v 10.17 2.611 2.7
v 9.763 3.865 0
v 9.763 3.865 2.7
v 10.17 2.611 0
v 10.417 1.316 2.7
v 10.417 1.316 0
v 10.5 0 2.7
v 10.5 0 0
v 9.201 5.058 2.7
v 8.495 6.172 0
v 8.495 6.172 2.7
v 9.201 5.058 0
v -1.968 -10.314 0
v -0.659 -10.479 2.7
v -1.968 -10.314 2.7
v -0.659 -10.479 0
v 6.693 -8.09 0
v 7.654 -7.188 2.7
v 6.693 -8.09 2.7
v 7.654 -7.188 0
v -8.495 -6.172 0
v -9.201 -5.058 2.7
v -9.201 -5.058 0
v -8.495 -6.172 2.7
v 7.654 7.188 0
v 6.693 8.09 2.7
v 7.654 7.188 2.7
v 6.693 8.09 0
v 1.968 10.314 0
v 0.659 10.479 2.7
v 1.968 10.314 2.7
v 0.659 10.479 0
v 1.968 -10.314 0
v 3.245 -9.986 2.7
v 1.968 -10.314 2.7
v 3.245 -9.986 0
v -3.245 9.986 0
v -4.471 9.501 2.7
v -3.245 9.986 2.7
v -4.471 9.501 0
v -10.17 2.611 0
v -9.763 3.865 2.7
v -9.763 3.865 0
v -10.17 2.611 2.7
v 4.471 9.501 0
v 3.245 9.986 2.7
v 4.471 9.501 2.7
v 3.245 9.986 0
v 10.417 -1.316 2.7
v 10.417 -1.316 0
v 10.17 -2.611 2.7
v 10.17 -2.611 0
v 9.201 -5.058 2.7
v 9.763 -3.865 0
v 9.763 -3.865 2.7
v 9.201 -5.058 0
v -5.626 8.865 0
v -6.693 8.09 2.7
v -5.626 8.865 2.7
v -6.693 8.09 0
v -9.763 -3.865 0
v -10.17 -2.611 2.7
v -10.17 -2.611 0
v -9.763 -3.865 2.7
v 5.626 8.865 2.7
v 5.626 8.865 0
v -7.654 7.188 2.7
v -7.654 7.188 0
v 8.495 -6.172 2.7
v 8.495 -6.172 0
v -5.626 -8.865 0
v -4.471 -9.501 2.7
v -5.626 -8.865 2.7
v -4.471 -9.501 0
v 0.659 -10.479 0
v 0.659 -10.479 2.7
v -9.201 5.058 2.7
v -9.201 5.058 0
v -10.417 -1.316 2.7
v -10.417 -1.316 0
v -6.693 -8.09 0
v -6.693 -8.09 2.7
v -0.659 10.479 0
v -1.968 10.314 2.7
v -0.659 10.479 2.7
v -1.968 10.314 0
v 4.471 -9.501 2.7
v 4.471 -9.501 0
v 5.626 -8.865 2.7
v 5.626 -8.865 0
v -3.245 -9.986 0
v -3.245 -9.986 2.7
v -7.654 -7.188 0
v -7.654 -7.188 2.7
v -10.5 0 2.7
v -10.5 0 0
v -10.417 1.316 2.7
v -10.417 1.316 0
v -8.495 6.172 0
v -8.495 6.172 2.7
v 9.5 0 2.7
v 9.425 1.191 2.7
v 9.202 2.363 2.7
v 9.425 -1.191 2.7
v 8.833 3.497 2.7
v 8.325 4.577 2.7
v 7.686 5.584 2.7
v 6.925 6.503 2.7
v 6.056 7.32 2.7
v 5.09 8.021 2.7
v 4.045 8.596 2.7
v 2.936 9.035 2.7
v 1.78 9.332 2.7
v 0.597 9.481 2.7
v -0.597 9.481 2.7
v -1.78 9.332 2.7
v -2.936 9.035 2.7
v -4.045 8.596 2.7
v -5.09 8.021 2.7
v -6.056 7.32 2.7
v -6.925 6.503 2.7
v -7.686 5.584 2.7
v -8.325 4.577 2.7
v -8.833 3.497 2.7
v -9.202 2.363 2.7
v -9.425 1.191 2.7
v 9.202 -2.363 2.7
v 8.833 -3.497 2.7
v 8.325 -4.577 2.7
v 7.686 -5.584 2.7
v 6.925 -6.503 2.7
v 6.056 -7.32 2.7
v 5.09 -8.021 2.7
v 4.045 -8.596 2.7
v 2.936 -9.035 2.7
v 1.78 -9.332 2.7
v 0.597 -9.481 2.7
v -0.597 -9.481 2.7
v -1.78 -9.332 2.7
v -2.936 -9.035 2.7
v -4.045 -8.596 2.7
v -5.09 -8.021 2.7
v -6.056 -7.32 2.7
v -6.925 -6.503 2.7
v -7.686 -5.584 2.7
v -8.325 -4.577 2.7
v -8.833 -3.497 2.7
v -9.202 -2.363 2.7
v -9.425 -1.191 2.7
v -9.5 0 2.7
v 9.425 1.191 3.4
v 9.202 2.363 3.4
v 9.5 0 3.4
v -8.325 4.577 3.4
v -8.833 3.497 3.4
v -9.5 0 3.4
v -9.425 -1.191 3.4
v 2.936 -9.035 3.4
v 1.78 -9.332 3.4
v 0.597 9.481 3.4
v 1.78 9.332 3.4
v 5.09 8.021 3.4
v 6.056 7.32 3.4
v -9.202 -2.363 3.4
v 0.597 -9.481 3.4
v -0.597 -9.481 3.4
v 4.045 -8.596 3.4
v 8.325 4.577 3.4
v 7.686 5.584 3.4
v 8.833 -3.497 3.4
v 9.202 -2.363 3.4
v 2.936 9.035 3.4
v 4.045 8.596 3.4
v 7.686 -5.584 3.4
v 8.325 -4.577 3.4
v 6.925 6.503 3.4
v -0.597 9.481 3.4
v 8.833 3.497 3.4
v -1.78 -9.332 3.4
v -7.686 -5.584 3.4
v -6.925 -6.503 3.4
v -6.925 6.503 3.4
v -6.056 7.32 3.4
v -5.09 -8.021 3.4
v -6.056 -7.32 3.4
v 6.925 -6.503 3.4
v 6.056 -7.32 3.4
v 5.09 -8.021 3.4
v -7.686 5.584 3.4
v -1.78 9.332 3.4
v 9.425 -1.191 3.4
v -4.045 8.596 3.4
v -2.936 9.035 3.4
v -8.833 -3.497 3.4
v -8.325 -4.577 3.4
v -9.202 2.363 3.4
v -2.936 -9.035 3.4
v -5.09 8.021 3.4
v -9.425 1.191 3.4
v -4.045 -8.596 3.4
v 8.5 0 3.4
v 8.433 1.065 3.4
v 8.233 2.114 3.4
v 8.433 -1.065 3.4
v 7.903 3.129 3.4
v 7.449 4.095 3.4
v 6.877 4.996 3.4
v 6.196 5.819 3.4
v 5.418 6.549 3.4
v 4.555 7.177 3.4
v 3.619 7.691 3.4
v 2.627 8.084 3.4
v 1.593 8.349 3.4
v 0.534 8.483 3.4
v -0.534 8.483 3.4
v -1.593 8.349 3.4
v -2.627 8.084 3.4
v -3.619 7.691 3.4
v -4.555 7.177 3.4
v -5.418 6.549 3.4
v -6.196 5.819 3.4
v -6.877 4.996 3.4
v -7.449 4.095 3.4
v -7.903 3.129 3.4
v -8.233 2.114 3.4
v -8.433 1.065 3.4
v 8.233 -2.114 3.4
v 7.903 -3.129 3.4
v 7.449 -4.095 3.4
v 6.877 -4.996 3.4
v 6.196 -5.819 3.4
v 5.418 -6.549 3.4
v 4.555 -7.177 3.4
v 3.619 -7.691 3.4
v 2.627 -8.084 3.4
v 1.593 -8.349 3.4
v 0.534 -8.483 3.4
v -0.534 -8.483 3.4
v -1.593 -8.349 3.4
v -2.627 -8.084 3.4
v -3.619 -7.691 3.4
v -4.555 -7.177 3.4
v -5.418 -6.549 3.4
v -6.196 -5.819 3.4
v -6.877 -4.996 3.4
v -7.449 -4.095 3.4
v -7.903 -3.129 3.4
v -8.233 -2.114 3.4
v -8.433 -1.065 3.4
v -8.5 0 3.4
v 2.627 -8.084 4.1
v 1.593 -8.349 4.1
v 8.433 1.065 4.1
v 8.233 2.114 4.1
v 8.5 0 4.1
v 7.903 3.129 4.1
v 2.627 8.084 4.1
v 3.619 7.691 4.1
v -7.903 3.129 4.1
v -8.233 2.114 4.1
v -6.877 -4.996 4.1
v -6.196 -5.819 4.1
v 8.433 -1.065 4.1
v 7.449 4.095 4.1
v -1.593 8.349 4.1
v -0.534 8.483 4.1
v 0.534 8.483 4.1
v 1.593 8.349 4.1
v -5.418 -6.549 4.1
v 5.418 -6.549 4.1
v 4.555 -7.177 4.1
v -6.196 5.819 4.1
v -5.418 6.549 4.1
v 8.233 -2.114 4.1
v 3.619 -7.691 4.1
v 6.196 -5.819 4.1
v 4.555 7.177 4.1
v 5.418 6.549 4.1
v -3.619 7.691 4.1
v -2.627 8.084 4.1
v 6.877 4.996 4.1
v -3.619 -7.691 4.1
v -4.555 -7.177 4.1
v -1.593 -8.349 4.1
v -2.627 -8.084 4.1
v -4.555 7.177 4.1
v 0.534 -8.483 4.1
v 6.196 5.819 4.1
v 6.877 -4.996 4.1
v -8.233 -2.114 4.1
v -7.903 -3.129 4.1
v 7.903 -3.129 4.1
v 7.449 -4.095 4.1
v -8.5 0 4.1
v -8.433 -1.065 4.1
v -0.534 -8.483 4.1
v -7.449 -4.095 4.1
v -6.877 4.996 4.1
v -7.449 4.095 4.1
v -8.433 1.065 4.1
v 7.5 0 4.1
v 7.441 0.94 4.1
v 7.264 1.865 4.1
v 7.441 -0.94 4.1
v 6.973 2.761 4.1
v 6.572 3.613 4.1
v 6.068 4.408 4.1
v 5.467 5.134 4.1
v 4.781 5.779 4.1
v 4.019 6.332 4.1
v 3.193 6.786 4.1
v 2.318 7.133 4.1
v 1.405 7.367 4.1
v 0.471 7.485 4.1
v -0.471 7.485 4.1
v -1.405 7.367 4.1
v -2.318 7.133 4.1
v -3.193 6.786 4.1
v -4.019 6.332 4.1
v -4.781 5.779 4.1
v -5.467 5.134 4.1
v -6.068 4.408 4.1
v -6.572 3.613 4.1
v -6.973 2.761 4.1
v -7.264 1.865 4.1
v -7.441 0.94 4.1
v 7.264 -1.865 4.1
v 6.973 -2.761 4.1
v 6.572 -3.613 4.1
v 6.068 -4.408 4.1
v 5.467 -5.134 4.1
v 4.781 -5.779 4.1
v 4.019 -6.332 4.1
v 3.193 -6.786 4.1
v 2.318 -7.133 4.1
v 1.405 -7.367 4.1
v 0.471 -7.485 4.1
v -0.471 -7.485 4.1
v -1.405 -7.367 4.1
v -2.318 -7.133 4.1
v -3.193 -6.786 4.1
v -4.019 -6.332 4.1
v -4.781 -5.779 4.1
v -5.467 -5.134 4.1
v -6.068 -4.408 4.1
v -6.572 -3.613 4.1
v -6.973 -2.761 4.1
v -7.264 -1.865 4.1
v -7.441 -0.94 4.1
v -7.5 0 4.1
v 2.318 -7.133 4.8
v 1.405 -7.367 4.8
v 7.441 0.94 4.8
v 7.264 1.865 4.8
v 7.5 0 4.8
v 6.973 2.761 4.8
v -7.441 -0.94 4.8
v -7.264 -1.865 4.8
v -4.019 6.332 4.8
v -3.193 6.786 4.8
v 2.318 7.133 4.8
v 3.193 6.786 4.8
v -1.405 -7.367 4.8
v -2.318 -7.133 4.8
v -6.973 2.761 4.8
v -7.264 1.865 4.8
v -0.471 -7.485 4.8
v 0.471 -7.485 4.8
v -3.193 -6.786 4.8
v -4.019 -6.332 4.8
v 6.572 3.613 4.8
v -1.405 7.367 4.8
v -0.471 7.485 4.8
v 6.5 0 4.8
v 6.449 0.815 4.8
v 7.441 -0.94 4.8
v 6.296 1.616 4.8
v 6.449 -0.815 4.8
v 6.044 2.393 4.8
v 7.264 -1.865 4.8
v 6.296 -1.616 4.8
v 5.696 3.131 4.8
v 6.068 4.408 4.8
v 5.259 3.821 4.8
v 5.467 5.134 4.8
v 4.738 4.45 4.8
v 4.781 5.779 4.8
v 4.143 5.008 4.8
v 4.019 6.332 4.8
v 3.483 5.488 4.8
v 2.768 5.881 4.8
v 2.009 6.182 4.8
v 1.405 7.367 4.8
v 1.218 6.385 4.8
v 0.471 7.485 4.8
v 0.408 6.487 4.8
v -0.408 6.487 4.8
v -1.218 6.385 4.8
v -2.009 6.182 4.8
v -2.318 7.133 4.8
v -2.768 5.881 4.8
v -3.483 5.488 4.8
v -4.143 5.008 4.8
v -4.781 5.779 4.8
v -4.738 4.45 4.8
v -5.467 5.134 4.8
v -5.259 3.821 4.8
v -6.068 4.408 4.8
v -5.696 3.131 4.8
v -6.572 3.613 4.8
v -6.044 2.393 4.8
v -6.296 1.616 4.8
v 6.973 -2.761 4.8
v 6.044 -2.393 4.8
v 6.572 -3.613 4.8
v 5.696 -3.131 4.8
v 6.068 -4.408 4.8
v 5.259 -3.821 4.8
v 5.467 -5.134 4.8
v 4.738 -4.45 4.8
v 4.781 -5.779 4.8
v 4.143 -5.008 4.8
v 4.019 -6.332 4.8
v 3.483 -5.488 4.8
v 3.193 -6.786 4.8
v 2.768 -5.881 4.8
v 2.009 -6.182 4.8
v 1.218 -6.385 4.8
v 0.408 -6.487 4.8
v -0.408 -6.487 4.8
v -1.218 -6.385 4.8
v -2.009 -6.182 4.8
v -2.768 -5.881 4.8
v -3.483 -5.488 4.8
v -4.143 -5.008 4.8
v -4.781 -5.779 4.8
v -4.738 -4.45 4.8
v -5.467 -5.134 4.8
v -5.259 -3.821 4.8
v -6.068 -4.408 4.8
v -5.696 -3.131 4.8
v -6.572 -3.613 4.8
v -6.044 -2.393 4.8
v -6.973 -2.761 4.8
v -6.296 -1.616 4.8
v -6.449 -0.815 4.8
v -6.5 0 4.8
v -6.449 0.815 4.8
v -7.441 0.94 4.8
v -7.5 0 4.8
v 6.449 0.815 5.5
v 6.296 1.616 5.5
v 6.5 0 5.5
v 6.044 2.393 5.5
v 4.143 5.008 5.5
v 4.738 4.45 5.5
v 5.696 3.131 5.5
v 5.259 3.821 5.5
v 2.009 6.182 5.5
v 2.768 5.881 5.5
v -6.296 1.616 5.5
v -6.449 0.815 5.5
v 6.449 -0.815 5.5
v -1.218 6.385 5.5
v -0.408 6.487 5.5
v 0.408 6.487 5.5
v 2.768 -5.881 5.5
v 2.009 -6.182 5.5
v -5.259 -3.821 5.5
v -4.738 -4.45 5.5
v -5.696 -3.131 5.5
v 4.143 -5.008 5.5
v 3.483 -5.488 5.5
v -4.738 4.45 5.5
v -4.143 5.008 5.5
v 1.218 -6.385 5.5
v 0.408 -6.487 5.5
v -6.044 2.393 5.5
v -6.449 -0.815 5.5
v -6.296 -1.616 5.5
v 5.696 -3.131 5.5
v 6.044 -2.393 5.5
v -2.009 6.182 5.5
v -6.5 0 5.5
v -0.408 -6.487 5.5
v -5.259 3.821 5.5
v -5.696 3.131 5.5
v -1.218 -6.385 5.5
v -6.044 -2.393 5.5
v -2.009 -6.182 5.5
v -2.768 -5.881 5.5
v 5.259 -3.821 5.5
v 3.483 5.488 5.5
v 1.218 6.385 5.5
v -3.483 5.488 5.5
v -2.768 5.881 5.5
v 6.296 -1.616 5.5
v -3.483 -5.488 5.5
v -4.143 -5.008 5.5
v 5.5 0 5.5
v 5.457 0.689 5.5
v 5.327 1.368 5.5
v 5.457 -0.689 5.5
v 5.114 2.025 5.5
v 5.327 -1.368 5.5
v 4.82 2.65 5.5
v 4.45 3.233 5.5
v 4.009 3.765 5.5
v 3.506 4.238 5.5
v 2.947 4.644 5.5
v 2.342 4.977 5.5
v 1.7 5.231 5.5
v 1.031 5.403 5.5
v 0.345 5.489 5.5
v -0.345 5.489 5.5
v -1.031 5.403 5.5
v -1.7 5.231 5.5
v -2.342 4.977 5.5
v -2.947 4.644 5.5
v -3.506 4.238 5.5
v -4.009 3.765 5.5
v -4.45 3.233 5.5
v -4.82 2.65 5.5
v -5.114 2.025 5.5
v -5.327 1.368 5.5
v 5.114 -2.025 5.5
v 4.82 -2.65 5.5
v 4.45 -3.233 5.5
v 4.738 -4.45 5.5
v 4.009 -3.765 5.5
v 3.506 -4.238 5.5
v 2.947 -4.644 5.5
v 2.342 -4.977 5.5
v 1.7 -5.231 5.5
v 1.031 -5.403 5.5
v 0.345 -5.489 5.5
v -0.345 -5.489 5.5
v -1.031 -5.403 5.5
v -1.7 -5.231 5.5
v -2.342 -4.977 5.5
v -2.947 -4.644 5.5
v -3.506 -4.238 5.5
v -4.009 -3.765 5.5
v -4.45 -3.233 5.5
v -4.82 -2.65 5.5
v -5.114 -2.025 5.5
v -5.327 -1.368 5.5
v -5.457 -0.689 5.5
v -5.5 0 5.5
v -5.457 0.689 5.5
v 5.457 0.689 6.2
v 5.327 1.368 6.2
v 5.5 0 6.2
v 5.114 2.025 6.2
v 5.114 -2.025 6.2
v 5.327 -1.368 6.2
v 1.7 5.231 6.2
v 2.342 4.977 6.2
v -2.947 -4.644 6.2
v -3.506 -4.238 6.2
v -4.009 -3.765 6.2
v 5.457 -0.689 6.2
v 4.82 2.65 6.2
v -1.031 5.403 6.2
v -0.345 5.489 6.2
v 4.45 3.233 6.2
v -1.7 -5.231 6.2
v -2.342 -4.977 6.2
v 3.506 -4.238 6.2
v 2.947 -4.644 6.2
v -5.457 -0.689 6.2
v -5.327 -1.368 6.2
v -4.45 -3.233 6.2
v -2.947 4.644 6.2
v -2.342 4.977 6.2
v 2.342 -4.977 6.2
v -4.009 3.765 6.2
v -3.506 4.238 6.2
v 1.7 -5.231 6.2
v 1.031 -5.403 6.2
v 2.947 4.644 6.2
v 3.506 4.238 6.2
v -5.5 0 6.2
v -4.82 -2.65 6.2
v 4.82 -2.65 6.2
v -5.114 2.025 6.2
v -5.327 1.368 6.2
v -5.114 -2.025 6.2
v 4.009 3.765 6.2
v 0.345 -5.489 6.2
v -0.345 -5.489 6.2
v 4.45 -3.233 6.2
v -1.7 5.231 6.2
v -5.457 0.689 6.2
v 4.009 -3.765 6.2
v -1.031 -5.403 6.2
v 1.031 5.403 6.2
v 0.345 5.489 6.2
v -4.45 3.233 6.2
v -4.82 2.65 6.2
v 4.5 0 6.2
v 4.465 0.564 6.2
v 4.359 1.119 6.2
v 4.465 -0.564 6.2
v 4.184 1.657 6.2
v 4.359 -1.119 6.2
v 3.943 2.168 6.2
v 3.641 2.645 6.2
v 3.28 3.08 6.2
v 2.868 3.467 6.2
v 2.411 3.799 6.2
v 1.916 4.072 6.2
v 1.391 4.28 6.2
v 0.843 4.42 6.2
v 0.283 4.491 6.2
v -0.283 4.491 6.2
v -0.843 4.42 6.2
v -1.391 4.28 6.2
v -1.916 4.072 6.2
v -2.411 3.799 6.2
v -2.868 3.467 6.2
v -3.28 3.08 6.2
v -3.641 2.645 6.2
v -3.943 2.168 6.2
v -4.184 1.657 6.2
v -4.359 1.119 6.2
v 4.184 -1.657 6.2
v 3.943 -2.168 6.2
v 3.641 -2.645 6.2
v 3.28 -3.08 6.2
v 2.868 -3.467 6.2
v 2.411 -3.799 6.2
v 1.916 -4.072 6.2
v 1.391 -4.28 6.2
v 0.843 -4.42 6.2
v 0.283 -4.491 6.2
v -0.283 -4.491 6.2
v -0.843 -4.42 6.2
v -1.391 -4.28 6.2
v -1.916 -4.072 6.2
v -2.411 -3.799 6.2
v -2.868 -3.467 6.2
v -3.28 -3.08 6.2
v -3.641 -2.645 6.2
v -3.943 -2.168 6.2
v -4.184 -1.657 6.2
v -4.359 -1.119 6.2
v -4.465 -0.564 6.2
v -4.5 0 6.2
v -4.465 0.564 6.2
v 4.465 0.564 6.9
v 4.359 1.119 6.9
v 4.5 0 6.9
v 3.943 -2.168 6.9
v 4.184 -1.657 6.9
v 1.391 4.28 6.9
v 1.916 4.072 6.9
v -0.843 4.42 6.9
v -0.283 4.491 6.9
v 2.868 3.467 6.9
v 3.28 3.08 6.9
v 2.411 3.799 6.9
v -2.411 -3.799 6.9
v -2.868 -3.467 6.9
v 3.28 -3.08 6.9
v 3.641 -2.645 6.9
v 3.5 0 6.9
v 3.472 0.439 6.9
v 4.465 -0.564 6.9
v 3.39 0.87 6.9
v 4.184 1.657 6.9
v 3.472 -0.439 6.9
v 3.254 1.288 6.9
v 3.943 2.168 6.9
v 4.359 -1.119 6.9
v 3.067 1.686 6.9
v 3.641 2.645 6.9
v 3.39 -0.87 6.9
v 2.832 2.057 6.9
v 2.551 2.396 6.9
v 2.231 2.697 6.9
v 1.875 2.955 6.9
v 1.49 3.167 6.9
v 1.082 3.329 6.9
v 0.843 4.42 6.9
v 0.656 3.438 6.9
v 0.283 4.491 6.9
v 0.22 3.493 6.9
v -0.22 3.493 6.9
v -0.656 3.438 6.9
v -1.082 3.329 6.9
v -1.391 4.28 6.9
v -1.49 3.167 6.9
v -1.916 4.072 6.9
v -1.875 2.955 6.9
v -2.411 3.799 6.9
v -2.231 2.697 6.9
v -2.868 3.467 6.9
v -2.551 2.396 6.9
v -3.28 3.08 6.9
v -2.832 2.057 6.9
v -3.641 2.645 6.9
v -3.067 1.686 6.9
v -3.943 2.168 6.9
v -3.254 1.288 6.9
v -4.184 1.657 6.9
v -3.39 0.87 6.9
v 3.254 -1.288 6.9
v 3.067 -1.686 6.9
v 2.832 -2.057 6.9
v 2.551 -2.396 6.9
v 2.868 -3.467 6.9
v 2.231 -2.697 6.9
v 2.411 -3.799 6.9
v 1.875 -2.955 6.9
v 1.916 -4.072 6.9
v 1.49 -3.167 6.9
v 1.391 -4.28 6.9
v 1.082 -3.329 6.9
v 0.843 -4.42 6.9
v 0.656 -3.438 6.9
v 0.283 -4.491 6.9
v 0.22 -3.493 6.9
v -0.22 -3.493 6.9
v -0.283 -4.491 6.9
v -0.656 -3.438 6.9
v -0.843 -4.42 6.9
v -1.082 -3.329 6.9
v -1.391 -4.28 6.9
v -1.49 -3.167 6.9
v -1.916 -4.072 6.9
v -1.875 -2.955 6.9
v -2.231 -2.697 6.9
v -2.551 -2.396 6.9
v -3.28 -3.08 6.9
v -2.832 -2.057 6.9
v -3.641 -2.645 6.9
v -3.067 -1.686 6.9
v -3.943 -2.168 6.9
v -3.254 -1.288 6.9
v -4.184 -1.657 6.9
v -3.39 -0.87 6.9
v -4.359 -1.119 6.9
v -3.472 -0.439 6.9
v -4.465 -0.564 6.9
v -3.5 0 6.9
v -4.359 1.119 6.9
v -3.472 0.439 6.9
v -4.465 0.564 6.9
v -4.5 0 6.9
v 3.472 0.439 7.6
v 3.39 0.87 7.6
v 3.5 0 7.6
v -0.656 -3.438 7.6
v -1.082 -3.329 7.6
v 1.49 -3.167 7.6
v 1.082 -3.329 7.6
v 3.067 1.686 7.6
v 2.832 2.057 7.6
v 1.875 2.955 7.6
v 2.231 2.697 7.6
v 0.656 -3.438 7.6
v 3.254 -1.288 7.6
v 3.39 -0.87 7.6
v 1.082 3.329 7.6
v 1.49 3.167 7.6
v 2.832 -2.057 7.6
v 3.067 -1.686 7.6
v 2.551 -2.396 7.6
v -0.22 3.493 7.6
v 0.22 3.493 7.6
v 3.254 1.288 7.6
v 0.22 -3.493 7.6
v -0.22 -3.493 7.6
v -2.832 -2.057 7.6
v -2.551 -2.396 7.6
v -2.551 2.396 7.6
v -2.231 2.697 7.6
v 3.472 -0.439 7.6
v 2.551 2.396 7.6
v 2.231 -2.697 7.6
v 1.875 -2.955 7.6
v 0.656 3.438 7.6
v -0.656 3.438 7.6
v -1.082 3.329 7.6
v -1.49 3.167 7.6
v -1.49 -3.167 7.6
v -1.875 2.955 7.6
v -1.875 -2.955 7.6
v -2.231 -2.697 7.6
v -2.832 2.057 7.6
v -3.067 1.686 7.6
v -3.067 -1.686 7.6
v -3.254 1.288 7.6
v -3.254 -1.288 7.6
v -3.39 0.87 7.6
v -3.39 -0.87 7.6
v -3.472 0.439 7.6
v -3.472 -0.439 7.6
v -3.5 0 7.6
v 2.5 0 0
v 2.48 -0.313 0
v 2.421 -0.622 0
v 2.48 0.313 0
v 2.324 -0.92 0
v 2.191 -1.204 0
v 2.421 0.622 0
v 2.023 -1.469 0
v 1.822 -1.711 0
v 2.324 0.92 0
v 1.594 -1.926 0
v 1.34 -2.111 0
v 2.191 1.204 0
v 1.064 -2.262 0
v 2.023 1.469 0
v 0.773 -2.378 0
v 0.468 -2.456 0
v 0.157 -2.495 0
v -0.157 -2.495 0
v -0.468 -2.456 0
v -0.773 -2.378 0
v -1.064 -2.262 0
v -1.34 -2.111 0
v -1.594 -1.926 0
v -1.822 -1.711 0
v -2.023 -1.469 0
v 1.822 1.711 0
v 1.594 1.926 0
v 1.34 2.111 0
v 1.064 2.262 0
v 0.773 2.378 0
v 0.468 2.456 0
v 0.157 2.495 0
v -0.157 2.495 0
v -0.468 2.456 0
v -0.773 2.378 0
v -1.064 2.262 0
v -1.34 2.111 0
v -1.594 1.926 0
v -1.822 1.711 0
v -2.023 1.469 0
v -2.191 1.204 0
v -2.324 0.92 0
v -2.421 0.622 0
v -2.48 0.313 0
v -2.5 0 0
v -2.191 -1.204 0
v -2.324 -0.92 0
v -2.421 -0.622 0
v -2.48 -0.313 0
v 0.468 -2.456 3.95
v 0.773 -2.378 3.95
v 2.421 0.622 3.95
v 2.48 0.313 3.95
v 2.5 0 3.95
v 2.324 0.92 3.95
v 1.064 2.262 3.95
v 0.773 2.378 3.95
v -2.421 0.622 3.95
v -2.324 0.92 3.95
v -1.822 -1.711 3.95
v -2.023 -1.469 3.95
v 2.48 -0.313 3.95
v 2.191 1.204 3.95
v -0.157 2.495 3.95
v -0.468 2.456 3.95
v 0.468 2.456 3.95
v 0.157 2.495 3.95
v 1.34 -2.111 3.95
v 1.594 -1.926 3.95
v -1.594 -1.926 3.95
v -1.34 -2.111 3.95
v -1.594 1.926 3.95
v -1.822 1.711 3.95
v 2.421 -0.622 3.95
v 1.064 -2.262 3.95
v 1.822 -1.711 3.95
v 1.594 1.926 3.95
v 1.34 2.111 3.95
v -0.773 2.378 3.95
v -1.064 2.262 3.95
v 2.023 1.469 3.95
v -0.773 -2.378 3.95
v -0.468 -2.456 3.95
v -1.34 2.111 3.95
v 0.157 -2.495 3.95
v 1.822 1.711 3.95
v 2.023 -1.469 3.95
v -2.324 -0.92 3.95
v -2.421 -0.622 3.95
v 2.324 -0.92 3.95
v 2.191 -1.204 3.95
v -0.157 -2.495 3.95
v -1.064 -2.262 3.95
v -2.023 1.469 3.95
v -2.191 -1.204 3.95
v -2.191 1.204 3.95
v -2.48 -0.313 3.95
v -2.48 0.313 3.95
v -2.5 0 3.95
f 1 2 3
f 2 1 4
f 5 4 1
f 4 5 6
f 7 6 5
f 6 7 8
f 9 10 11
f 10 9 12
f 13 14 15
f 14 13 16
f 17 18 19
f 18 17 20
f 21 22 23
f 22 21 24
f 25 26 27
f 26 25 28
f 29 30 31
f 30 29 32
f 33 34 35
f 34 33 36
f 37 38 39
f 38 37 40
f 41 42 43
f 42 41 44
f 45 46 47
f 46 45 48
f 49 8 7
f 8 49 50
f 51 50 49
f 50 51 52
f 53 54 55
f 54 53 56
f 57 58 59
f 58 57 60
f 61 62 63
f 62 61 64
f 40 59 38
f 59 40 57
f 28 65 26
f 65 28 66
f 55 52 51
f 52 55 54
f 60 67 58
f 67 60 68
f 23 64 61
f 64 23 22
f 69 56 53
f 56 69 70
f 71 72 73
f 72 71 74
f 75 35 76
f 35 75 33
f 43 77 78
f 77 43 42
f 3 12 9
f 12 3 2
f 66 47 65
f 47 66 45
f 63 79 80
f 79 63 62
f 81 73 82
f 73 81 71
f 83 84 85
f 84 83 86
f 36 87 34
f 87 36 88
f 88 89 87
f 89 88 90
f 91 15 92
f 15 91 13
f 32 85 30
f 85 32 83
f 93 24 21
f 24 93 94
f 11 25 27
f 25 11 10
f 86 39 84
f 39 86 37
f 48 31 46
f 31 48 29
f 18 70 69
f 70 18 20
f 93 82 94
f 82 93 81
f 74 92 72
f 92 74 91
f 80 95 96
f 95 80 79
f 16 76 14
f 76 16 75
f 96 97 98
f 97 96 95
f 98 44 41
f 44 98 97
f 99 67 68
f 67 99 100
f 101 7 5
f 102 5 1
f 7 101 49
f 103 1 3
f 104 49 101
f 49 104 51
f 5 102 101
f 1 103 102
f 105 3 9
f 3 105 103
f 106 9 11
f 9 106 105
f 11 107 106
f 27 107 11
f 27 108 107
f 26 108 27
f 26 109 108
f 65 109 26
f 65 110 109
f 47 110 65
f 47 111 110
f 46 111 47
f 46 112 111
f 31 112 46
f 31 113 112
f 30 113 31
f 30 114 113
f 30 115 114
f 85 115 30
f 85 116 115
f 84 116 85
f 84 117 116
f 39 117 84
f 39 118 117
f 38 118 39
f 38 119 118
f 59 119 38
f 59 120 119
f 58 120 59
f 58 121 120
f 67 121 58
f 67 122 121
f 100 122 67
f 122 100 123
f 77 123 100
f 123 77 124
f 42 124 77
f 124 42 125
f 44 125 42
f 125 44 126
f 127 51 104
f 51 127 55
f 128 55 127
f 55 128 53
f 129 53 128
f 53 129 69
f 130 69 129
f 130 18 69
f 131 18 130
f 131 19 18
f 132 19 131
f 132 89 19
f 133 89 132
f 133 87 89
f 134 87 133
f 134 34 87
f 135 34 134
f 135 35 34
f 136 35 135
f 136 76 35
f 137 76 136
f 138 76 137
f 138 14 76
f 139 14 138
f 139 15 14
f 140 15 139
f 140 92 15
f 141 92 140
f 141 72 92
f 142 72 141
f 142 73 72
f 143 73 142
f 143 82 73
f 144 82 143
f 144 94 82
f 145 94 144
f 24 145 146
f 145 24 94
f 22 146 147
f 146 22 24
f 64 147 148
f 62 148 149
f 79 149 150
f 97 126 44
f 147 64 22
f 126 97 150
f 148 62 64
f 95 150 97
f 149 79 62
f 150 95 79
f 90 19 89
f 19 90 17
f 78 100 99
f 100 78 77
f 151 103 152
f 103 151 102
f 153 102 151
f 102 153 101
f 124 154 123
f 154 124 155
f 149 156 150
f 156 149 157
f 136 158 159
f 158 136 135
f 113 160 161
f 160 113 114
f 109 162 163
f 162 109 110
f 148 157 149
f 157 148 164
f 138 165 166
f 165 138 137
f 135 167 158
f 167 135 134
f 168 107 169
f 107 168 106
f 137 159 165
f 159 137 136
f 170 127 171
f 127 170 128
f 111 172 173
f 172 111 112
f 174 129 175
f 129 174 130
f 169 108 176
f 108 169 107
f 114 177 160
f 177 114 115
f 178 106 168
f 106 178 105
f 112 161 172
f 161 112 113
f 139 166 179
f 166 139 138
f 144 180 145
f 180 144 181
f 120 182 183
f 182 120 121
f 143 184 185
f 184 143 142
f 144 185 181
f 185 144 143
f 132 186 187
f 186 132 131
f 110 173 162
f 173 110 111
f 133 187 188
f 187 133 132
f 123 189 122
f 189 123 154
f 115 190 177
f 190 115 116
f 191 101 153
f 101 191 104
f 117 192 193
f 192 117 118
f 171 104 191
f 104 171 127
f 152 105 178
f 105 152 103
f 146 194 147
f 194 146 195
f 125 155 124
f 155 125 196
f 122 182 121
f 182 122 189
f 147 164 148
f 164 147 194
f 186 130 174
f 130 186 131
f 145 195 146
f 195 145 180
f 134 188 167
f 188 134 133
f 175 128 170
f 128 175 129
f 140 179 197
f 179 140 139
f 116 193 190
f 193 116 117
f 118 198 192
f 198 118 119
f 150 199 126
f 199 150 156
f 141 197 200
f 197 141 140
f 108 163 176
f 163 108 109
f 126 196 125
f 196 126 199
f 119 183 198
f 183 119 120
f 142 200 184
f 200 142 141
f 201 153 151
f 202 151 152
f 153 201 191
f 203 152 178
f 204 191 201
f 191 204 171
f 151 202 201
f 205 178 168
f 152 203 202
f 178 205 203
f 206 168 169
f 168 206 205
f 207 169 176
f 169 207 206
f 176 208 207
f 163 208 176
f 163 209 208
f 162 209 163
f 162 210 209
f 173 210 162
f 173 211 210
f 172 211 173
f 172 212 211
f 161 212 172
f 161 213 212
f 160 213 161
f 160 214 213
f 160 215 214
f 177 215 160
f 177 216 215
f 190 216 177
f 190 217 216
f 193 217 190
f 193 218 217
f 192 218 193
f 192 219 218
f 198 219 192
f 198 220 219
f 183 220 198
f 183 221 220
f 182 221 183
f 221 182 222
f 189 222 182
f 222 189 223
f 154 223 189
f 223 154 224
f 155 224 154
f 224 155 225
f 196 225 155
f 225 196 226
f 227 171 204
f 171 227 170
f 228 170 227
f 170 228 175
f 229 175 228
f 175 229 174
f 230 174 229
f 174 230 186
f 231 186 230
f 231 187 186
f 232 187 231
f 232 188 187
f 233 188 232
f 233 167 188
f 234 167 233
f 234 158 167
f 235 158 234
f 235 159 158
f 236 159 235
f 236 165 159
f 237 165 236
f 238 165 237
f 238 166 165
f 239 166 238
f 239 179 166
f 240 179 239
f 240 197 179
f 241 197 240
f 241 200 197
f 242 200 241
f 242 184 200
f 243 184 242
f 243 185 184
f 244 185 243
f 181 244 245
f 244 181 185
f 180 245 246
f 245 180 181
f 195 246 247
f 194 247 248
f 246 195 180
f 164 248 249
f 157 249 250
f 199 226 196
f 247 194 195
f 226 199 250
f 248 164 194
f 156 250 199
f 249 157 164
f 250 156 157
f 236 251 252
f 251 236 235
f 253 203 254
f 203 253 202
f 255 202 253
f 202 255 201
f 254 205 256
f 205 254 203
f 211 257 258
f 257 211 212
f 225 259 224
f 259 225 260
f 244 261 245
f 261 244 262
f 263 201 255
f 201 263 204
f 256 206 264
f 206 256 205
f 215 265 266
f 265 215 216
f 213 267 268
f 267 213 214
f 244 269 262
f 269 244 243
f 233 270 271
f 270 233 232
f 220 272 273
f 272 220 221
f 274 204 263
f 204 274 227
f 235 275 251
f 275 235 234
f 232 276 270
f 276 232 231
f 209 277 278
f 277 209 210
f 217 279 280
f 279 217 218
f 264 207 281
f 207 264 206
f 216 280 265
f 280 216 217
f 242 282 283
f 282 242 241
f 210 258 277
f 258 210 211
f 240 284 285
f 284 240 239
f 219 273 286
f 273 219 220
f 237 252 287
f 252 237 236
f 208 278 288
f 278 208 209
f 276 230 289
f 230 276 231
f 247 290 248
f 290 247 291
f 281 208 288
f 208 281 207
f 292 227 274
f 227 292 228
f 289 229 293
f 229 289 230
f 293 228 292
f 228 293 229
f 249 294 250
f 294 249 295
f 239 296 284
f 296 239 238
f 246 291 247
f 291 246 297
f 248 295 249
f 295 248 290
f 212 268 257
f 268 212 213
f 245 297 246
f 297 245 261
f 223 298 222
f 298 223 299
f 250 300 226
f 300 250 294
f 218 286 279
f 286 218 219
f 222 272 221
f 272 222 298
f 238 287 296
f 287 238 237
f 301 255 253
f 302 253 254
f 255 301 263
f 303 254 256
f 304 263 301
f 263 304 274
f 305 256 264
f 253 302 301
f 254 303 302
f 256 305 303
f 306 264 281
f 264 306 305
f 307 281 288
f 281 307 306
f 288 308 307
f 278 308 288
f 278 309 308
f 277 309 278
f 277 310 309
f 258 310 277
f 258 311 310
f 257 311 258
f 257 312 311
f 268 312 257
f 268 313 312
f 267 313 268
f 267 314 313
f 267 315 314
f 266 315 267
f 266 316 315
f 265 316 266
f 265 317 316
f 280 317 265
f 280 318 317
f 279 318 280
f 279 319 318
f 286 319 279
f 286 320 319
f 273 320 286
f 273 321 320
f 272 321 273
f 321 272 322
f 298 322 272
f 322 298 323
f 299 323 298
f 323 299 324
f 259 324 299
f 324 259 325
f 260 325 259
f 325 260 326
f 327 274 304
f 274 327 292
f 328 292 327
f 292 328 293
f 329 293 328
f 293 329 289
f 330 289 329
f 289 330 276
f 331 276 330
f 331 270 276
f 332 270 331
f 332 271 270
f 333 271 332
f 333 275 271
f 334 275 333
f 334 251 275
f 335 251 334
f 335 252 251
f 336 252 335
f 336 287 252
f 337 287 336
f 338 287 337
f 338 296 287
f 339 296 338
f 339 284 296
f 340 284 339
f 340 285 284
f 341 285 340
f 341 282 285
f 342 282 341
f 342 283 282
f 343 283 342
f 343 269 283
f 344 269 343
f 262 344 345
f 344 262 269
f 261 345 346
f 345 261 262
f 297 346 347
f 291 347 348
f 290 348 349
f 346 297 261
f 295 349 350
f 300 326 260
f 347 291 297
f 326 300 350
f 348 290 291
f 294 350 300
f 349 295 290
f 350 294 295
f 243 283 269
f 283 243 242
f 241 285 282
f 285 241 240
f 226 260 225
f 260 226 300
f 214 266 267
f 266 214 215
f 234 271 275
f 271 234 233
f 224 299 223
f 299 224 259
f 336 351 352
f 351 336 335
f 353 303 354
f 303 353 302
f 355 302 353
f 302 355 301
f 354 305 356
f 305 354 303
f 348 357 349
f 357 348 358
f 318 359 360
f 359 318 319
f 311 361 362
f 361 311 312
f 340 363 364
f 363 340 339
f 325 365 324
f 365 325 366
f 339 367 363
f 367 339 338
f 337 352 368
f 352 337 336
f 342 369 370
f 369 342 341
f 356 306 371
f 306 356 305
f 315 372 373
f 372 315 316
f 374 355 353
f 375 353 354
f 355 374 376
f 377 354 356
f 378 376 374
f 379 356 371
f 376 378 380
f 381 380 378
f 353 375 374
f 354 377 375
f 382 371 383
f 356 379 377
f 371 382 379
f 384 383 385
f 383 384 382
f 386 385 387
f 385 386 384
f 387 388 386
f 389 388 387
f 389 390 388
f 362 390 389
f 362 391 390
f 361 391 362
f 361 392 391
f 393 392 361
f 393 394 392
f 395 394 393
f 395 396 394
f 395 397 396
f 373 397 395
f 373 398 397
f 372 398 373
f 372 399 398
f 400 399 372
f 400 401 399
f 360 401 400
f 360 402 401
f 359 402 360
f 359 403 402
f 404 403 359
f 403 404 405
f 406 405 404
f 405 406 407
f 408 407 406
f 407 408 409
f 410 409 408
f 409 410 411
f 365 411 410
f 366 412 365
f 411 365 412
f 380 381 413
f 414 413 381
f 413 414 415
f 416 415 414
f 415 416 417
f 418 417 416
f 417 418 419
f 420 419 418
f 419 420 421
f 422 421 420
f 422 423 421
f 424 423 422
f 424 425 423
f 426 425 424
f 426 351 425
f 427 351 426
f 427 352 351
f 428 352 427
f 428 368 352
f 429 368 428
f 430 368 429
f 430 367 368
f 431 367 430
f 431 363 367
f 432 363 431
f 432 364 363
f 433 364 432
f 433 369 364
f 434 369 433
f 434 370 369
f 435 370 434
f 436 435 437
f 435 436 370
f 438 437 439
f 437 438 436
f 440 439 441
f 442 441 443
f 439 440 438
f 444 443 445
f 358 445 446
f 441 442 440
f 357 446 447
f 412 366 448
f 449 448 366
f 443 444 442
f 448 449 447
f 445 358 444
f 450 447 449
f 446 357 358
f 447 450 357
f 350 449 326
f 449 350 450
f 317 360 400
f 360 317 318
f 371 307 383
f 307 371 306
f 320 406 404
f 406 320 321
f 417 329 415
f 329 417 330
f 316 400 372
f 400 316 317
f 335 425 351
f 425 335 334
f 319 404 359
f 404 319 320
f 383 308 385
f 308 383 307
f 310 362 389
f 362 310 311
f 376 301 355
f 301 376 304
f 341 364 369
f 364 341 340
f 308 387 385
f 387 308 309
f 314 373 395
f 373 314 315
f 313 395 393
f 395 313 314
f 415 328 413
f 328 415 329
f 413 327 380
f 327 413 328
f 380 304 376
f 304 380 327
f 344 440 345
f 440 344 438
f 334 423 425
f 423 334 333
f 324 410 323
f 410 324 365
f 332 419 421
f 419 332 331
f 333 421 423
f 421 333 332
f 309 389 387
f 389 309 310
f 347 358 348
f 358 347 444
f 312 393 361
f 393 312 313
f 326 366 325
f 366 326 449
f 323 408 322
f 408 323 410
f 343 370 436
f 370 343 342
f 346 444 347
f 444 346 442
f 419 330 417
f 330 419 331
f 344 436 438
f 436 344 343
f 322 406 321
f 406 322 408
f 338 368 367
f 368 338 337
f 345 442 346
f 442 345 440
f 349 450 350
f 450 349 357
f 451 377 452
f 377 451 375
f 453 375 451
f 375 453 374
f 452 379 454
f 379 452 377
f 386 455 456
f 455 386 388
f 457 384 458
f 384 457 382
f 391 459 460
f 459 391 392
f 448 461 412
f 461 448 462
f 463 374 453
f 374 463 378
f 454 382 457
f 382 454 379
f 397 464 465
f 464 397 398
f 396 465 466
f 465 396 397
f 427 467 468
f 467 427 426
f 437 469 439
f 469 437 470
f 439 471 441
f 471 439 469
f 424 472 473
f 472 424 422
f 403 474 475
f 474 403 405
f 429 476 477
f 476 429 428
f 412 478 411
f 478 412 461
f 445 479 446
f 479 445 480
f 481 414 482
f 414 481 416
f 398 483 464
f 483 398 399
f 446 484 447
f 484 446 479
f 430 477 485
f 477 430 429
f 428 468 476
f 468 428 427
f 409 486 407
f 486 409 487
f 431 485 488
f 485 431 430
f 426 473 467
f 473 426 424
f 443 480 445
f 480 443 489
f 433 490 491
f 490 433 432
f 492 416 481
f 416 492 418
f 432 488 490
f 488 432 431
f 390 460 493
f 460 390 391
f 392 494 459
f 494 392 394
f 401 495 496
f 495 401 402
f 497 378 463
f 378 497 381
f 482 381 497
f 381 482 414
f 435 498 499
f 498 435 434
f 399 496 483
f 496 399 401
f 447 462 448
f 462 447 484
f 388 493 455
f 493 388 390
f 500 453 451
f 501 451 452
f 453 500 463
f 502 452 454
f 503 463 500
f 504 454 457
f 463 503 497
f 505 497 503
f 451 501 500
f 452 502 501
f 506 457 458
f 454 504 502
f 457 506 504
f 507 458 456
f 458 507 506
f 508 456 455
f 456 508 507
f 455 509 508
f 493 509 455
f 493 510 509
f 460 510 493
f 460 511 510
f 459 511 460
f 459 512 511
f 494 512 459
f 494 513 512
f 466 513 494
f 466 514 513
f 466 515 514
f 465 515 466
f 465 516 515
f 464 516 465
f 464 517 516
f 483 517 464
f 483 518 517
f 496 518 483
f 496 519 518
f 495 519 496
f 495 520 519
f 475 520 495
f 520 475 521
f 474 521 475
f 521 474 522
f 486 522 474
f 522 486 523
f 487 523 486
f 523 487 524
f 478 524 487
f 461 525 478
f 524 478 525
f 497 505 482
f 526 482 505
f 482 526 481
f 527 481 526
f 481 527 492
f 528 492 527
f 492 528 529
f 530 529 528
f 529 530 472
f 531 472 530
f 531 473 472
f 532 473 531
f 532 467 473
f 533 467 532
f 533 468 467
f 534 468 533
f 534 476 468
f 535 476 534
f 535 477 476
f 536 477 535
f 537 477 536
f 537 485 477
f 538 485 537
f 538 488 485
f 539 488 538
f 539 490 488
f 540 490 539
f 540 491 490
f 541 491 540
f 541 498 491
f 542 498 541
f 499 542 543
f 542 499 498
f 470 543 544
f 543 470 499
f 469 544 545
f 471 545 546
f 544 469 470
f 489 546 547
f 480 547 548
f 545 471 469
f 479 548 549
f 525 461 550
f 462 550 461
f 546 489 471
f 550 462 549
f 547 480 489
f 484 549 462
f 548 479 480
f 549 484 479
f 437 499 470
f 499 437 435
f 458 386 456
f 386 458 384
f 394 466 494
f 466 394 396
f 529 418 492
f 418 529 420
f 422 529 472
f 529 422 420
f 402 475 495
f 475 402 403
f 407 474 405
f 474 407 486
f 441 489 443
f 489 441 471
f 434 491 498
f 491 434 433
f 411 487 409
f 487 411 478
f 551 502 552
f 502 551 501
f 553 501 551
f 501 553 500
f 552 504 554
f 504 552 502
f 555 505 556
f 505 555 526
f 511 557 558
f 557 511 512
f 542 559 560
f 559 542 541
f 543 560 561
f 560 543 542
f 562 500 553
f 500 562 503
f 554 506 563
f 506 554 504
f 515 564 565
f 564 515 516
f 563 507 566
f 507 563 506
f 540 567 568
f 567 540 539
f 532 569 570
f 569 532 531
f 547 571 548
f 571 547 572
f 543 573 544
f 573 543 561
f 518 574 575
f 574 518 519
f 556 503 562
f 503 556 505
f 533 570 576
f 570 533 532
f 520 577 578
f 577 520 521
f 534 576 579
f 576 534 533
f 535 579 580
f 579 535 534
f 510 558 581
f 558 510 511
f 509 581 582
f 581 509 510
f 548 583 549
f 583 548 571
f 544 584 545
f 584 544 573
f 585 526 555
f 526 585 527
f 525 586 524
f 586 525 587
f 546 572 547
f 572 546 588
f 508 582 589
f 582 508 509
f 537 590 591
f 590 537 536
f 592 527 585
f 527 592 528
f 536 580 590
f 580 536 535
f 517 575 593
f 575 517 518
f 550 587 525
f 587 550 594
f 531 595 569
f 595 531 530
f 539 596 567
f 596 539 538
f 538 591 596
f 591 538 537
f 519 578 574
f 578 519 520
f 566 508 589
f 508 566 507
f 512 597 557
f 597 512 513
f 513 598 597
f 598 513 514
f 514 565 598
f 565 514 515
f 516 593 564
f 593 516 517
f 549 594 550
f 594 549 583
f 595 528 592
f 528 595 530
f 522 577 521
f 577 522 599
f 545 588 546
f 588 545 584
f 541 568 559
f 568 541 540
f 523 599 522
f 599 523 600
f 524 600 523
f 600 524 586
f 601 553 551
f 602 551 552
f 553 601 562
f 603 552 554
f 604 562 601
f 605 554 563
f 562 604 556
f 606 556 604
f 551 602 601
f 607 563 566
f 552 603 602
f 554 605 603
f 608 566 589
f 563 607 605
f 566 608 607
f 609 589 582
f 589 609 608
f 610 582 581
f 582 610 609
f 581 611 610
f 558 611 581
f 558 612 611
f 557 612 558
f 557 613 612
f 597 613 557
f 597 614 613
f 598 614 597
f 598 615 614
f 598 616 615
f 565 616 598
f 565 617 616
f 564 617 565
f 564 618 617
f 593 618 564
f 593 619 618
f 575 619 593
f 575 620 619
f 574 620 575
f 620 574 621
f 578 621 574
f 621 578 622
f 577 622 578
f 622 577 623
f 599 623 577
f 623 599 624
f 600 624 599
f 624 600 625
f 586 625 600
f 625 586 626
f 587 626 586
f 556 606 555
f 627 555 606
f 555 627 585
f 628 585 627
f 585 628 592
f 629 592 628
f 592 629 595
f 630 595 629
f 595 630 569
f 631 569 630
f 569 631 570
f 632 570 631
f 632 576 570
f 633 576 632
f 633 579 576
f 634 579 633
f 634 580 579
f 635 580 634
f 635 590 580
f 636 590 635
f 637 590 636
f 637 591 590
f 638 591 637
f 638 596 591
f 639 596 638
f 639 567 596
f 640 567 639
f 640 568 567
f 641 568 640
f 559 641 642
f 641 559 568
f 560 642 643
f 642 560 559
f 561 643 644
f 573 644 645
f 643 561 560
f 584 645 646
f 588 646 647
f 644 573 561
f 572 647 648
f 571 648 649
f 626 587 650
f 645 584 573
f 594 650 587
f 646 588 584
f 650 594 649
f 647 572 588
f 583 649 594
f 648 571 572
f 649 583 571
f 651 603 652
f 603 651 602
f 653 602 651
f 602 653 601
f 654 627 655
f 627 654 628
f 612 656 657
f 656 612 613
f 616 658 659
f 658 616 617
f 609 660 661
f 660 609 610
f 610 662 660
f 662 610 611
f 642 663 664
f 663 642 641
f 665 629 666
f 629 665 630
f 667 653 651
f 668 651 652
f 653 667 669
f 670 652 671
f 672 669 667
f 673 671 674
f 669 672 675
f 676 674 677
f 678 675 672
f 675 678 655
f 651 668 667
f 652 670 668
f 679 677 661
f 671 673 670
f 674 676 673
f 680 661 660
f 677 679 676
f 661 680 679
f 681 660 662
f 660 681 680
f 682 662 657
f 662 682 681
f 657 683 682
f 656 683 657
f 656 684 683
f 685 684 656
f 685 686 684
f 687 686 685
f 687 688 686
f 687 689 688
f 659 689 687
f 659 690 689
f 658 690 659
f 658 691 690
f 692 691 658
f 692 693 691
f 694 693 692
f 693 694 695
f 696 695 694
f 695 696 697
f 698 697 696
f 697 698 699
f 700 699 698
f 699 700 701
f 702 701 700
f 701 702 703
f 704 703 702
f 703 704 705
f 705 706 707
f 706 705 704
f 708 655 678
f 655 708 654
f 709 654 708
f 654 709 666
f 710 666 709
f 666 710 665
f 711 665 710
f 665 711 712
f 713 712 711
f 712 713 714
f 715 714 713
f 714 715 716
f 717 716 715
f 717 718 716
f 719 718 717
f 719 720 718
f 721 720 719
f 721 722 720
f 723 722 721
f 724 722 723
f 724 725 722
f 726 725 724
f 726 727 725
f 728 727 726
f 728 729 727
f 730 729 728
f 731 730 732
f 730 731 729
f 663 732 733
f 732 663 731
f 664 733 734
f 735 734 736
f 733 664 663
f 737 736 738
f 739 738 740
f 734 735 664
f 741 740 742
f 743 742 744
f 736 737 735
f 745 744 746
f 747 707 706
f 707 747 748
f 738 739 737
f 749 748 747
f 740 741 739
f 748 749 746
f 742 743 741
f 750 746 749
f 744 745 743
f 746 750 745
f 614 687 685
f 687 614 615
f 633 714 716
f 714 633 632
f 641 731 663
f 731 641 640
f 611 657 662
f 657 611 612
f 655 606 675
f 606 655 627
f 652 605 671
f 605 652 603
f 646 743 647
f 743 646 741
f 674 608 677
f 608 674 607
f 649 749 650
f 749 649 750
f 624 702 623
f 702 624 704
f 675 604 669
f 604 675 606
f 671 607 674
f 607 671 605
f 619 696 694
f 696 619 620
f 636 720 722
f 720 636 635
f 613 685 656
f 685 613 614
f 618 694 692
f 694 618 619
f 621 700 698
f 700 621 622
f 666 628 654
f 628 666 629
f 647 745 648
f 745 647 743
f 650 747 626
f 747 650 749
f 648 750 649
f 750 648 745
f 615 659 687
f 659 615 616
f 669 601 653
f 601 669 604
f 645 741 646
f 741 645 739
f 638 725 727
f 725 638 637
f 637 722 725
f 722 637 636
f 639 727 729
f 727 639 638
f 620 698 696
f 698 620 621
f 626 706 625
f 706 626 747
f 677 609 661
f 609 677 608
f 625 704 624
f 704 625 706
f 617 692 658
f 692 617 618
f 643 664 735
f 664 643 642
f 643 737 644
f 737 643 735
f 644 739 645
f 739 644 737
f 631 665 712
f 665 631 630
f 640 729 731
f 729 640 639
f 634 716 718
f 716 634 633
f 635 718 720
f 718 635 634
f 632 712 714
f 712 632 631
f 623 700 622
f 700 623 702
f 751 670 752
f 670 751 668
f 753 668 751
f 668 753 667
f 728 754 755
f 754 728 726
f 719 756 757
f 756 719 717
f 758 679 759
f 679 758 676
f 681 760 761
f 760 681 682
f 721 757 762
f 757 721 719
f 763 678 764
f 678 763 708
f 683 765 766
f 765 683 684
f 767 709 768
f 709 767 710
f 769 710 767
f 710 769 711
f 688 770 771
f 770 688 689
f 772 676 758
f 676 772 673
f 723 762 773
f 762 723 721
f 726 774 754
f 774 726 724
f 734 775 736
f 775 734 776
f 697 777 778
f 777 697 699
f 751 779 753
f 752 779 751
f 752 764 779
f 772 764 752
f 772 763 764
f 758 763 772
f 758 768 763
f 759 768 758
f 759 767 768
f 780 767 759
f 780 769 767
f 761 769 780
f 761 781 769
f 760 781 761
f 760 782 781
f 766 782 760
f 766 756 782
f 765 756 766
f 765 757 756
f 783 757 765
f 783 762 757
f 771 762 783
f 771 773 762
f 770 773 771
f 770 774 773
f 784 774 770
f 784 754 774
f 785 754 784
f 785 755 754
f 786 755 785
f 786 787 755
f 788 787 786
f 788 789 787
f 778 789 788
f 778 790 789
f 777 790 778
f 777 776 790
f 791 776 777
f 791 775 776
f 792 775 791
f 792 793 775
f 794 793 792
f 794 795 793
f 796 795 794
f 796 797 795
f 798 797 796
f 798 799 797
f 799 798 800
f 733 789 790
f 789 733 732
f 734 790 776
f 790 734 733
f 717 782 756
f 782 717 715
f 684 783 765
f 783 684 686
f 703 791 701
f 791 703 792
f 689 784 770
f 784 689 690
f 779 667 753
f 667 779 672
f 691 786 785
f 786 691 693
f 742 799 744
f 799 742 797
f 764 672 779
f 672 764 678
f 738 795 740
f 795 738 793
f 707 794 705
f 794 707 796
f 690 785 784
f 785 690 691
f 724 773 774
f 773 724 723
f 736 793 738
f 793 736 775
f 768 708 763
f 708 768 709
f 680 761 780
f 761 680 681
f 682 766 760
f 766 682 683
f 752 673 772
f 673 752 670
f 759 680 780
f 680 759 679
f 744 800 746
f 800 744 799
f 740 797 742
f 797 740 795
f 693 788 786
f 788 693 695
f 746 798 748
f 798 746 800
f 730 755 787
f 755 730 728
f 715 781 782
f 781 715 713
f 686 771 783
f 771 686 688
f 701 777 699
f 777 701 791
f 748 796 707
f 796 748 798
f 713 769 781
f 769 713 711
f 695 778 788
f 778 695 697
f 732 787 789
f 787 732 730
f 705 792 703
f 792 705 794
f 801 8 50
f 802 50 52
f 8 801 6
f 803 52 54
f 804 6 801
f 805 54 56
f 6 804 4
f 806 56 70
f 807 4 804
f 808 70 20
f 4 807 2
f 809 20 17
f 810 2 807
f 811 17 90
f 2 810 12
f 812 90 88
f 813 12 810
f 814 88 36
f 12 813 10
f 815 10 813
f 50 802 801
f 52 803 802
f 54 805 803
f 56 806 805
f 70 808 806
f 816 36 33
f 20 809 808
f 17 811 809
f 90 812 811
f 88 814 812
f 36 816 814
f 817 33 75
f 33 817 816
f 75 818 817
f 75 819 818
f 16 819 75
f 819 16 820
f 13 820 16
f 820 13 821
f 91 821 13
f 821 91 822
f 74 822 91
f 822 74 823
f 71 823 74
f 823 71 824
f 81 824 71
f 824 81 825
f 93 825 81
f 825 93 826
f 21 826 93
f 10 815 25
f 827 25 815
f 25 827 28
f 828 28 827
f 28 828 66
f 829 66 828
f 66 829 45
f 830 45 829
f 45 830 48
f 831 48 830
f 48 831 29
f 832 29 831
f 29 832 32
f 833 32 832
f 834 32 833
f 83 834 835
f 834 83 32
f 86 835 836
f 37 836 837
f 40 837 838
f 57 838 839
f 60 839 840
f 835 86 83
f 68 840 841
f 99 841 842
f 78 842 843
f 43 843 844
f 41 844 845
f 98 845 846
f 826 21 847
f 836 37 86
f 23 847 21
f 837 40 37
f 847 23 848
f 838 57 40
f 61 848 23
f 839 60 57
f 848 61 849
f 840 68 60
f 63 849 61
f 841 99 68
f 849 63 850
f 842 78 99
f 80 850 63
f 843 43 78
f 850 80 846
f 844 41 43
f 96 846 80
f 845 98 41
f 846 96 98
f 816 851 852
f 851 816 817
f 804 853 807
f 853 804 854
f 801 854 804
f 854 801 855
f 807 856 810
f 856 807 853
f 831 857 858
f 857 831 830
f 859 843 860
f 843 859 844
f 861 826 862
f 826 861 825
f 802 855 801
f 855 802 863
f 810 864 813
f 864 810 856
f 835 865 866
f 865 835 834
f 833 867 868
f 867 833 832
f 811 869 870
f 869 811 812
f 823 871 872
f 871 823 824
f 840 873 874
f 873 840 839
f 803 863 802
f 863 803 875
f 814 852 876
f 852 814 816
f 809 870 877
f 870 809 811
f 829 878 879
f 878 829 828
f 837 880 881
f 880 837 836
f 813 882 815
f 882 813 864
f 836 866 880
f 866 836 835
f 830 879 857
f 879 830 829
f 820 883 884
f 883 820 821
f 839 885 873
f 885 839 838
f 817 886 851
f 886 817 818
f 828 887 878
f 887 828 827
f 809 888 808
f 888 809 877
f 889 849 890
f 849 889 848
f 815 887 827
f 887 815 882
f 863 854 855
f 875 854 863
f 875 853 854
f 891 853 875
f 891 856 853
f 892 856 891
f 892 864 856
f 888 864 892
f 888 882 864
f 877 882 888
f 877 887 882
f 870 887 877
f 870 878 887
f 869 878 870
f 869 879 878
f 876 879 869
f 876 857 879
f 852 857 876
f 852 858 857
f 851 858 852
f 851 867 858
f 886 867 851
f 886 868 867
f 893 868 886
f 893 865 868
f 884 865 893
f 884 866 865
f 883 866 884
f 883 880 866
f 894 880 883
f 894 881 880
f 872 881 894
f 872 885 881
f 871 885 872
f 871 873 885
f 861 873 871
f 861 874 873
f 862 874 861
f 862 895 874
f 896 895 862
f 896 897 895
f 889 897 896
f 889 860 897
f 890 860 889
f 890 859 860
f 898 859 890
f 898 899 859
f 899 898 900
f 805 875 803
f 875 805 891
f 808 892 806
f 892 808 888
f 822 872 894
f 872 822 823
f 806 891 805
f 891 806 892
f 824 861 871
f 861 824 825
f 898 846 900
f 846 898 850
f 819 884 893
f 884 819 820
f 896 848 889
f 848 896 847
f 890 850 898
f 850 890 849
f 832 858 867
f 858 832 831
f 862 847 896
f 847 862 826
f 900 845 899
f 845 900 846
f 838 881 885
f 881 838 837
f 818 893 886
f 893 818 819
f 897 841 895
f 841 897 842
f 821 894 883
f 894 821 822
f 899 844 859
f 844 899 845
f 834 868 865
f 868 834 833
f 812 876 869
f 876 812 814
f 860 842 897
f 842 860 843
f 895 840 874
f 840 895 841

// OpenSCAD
// file: joystick_defines.scad
// Standard skate bearing
bearing_inside_dia = 8;
bearing_outside_dia = 22;
bearing_thickness = 7;

// Arbitrary value
shaft_dia = 15;

z_fight_fudge = 0.05;
//z_fight_fudge = 0;

// Set this to 1 to translate everything to printable mode
printable_mode = 0;

// Gimba corel block sizes 
gimbal_core_x = 50;
gimbal_core_y = 30;
gimbal_core_z = gimbal_core_y;

// Gimbal frame sizes 

gimbal_frame_thickness = 10; 

// The 1.8 is 2sin(45)ish, the maximum y on the xy plane the core can occupy
gimbal_frame_x = gimbal_core_x+2*gimbal_frame_thickness+2; 
gimbal_frame_y = (gimbal_core_y * 1.8)+gimbal_frame_thickness;
gimbal_frame_z = gimbal_core_z;

circle_faces = 50;

module bearing()
{
	difference()
	{
		cylinder(h=7+2*z_fight_fudge, r = (bearing_outside_dia/2), $fn=circle_faces);

		/*translate([0,0,-z_fight_fudge])
			%cylinder(h=9, r = (bearing_inside_dia/2), $fn=circle_faces);*/
	}
}
		
// main file
include <joystick_defines.scad>

// variables for little microswitch pushbutton, might move these to joystick_defines
pb_xy = 7.5;
pb_z = 4; // Height minus pushbutton
pb_btn_z = 1.5;
pb_total_z = pb_z+pb_btn_z;
pb_btn_dia = 3;
pb_leg_x = 4;
pb_leg_y = 5;
pb_leg_z = 0.7;

4_way_hat_base_dia = 21;
4_way_hat_base_base_z = 2; // Base thickness
4_way_hat_base_z = pb_xy + 4_way_hat_base_base_z;

4_way_hat_base_screw_dia = 5;

/*hat_base(4);
translate([0,0,10])
	4_way_hat_washer();
translate([0,0,13])
	switch_hat_saddle();*/
	switch_hat_hanoi();
//pb(1);

module hat_base(numDirs)
{
	difference()
	{
		cylinder(r=(4_way_hat_base_dia/2), h=4_way_hat_base_z, $fn=circle_faces);
		
		translate([0,pb_total_z+(4_way_hat_base_screw_dia/2),4_way_hat_base_z-pb_xy/2+z_fight_fudge])
			rotate([90,0,0])
				pb(1);
		translate([0,-pb_total_z-(4_way_hat_base_screw_dia/2),4_way_hat_base_z-pb_xy/2+z_fight_fudge])
			rotate([-90,180,0])
				pb(1);
		if (numDirs==4)
		{
			translate([pb_total_z+(4_way_hat_base_screw_dia/2),0,4_way_hat_base_z-pb_xy/2+z_fight_fudge])
				rotate([90,0,-90])
					pb(1);
			translate([-pb_total_z-(4_way_hat_base_screw_dia/2),0,4_way_hat_base_z-pb_xy/2+z_fight_fudge])
				rotate([-90,180,-90])
					pb(1);
//			// Now chop the bit out of the middle
			translate([0,0,4_way_hat_base_base_z+5+z_fight_fudge])
				cube([4_way_hat_base_screw_dia+2*pb_btn_z+z_fight_fudge,4_way_hat_base_screw_dia+2*pb_btn_z+z_fight_fudge,10],center=true);
		} else	{
			// Now chop the bit out of the middle
			translate([0,0,4_way_hat_base_base_z+5])
				cube([4_way_hat_base_screw_dia,4_way_hat_base_screw_dia+2*pb_btn_z+z_fight_fudge,10],center=true);
		}

		// Now chop the bit out of the middle
		/*translate([0,0,4_way_hat_base_base_z+5])
			cube([pb_xy+z_fight_fudge,pb_xy+z_fight_fudge,10],center=true);*/

		// Screw
		translate([0,0,-1])
			cylinder(r=4_way_hat_base_screw_dia/2, h=4_way_hat_base_z*1, $fn=circle_faces);
	}		
}

// Next up: build the hat that goes on top out of a series of stacking cylinders, tower of hanoi style with a 4_way_hat_base_screw_dia hole in the bottom

module switch_hat_saddle()
{
	step_size = 2; // Won't really work for anything other than 2, sorry.
	num_steps = 4_way_hat_base_dia / step_size;
	switch_hat_saddle_base_depth = 4;


	union()
	{
		translate([0,0,switch_hat_saddle_base_depth])
			intersection()
			{
				cylinder(r = (4_way_hat_base_dia/2), h = 10, $fn=circle_faces);
				for (n = [0:num_steps])
				{
					translate([-(4_way_hat_base_dia/2)+n*step_size+0.25*step_size,0,0])
						cube([step_size, 4_way_hat_base_dia, abs((num_steps/2)-n)*1.5],center=true);
				}
			}
		difference()
		{
			cylinder(r = (4_way_hat_base_dia/2), h = switch_hat_saddle_base_depth, $fn=circle_faces);
			translate([0,0,-z_fight_fudge])
				cylinder(r=(4_way_hat_base_screw_dia/2), h =switch_hat_saddle_base_depth, $fn=circle_faces);
		}
	}
}

module switch_hat_hanoi()
{
	
	difference()
	{
		union()
		{
			cylinder(r = (4_way_hat_base_dia/2), h = 2, $fn=circle_faces);
			translate([0,0,2])
			{
				for (n = [1:8])
				{
					cylinder(r = (4_way_hat_base_dia/2 - (n-1)), h = n*0.7, $fn=circle_faces);
				}
			}
		}
		translate([0,0,-z_fight_fudge])
			cylinder(r=(4_way_hat_base_screw_dia/2), h = 4, $fn=circle_faces);
	}	
}

module 4_way_hat_washer()
{
	difference()
	{
		cylinder(r=(4_way_hat_base_dia/2), h = 1, $fn=circle_faces);
		translate([0,0,-z_fight_fudge])
			cylinder(r=(4_way_hat_base_screw_dia/2), h = 1+2*z_fight_fudge, $fn=circle_faces);
	}
}
		

module pb(puff)
{
	translate([0,0,pb_z/2])
	{
		// Puff set to 1 if you want a realistic model of a button.
		// Puff variable used for making holes in things bigger than the button size
		cube([pb_xy,pb_xy,puff*pb_z],center=true);
	
		// Button knob itself
		translate([0,0,pb_z/2-z_fight_fudge])
			cylinder(r=(pb_btn_dia/2),h=pb_btn_z,$fn=circle_faces);
	
		// Button legs
		translate([pb_xy/2-pb_leg_x/2,-pb_xy/2-pb_leg_y/2+z_fight_fudge,-pb_z/2+pb_leg_z/2])
			cube([pb_leg_x,pb_leg_y,pb_leg_z],center=true);
		translate([-pb_xy/2+pb_leg_x/2,-pb_xy/2-pb_leg_y/2+z_fight_fudge,-pb_z/2+pb_leg_z/2])
			cube([pb_leg_x,pb_leg_y,pb_leg_z],center=true);
		/* snip
		translate([pb_xy/2-pb_leg_x/2,pb_xy/2+pb_leg_y/2-z_fight_fudge,-pb_z/2+pb_leg_z/2])
			cube([pb_leg_x,pb_leg_y,pb_leg_z],center=true);
		translate([-pb_xy/2+pb_leg_x/2,pb_xy/2+pb_leg_y/2-z_fight_fudge,-pb_z/2+pb_leg_z/2])
			cube([pb_leg_x,pb_leg_y,pb_leg_z],center=true);*/
	}

}
